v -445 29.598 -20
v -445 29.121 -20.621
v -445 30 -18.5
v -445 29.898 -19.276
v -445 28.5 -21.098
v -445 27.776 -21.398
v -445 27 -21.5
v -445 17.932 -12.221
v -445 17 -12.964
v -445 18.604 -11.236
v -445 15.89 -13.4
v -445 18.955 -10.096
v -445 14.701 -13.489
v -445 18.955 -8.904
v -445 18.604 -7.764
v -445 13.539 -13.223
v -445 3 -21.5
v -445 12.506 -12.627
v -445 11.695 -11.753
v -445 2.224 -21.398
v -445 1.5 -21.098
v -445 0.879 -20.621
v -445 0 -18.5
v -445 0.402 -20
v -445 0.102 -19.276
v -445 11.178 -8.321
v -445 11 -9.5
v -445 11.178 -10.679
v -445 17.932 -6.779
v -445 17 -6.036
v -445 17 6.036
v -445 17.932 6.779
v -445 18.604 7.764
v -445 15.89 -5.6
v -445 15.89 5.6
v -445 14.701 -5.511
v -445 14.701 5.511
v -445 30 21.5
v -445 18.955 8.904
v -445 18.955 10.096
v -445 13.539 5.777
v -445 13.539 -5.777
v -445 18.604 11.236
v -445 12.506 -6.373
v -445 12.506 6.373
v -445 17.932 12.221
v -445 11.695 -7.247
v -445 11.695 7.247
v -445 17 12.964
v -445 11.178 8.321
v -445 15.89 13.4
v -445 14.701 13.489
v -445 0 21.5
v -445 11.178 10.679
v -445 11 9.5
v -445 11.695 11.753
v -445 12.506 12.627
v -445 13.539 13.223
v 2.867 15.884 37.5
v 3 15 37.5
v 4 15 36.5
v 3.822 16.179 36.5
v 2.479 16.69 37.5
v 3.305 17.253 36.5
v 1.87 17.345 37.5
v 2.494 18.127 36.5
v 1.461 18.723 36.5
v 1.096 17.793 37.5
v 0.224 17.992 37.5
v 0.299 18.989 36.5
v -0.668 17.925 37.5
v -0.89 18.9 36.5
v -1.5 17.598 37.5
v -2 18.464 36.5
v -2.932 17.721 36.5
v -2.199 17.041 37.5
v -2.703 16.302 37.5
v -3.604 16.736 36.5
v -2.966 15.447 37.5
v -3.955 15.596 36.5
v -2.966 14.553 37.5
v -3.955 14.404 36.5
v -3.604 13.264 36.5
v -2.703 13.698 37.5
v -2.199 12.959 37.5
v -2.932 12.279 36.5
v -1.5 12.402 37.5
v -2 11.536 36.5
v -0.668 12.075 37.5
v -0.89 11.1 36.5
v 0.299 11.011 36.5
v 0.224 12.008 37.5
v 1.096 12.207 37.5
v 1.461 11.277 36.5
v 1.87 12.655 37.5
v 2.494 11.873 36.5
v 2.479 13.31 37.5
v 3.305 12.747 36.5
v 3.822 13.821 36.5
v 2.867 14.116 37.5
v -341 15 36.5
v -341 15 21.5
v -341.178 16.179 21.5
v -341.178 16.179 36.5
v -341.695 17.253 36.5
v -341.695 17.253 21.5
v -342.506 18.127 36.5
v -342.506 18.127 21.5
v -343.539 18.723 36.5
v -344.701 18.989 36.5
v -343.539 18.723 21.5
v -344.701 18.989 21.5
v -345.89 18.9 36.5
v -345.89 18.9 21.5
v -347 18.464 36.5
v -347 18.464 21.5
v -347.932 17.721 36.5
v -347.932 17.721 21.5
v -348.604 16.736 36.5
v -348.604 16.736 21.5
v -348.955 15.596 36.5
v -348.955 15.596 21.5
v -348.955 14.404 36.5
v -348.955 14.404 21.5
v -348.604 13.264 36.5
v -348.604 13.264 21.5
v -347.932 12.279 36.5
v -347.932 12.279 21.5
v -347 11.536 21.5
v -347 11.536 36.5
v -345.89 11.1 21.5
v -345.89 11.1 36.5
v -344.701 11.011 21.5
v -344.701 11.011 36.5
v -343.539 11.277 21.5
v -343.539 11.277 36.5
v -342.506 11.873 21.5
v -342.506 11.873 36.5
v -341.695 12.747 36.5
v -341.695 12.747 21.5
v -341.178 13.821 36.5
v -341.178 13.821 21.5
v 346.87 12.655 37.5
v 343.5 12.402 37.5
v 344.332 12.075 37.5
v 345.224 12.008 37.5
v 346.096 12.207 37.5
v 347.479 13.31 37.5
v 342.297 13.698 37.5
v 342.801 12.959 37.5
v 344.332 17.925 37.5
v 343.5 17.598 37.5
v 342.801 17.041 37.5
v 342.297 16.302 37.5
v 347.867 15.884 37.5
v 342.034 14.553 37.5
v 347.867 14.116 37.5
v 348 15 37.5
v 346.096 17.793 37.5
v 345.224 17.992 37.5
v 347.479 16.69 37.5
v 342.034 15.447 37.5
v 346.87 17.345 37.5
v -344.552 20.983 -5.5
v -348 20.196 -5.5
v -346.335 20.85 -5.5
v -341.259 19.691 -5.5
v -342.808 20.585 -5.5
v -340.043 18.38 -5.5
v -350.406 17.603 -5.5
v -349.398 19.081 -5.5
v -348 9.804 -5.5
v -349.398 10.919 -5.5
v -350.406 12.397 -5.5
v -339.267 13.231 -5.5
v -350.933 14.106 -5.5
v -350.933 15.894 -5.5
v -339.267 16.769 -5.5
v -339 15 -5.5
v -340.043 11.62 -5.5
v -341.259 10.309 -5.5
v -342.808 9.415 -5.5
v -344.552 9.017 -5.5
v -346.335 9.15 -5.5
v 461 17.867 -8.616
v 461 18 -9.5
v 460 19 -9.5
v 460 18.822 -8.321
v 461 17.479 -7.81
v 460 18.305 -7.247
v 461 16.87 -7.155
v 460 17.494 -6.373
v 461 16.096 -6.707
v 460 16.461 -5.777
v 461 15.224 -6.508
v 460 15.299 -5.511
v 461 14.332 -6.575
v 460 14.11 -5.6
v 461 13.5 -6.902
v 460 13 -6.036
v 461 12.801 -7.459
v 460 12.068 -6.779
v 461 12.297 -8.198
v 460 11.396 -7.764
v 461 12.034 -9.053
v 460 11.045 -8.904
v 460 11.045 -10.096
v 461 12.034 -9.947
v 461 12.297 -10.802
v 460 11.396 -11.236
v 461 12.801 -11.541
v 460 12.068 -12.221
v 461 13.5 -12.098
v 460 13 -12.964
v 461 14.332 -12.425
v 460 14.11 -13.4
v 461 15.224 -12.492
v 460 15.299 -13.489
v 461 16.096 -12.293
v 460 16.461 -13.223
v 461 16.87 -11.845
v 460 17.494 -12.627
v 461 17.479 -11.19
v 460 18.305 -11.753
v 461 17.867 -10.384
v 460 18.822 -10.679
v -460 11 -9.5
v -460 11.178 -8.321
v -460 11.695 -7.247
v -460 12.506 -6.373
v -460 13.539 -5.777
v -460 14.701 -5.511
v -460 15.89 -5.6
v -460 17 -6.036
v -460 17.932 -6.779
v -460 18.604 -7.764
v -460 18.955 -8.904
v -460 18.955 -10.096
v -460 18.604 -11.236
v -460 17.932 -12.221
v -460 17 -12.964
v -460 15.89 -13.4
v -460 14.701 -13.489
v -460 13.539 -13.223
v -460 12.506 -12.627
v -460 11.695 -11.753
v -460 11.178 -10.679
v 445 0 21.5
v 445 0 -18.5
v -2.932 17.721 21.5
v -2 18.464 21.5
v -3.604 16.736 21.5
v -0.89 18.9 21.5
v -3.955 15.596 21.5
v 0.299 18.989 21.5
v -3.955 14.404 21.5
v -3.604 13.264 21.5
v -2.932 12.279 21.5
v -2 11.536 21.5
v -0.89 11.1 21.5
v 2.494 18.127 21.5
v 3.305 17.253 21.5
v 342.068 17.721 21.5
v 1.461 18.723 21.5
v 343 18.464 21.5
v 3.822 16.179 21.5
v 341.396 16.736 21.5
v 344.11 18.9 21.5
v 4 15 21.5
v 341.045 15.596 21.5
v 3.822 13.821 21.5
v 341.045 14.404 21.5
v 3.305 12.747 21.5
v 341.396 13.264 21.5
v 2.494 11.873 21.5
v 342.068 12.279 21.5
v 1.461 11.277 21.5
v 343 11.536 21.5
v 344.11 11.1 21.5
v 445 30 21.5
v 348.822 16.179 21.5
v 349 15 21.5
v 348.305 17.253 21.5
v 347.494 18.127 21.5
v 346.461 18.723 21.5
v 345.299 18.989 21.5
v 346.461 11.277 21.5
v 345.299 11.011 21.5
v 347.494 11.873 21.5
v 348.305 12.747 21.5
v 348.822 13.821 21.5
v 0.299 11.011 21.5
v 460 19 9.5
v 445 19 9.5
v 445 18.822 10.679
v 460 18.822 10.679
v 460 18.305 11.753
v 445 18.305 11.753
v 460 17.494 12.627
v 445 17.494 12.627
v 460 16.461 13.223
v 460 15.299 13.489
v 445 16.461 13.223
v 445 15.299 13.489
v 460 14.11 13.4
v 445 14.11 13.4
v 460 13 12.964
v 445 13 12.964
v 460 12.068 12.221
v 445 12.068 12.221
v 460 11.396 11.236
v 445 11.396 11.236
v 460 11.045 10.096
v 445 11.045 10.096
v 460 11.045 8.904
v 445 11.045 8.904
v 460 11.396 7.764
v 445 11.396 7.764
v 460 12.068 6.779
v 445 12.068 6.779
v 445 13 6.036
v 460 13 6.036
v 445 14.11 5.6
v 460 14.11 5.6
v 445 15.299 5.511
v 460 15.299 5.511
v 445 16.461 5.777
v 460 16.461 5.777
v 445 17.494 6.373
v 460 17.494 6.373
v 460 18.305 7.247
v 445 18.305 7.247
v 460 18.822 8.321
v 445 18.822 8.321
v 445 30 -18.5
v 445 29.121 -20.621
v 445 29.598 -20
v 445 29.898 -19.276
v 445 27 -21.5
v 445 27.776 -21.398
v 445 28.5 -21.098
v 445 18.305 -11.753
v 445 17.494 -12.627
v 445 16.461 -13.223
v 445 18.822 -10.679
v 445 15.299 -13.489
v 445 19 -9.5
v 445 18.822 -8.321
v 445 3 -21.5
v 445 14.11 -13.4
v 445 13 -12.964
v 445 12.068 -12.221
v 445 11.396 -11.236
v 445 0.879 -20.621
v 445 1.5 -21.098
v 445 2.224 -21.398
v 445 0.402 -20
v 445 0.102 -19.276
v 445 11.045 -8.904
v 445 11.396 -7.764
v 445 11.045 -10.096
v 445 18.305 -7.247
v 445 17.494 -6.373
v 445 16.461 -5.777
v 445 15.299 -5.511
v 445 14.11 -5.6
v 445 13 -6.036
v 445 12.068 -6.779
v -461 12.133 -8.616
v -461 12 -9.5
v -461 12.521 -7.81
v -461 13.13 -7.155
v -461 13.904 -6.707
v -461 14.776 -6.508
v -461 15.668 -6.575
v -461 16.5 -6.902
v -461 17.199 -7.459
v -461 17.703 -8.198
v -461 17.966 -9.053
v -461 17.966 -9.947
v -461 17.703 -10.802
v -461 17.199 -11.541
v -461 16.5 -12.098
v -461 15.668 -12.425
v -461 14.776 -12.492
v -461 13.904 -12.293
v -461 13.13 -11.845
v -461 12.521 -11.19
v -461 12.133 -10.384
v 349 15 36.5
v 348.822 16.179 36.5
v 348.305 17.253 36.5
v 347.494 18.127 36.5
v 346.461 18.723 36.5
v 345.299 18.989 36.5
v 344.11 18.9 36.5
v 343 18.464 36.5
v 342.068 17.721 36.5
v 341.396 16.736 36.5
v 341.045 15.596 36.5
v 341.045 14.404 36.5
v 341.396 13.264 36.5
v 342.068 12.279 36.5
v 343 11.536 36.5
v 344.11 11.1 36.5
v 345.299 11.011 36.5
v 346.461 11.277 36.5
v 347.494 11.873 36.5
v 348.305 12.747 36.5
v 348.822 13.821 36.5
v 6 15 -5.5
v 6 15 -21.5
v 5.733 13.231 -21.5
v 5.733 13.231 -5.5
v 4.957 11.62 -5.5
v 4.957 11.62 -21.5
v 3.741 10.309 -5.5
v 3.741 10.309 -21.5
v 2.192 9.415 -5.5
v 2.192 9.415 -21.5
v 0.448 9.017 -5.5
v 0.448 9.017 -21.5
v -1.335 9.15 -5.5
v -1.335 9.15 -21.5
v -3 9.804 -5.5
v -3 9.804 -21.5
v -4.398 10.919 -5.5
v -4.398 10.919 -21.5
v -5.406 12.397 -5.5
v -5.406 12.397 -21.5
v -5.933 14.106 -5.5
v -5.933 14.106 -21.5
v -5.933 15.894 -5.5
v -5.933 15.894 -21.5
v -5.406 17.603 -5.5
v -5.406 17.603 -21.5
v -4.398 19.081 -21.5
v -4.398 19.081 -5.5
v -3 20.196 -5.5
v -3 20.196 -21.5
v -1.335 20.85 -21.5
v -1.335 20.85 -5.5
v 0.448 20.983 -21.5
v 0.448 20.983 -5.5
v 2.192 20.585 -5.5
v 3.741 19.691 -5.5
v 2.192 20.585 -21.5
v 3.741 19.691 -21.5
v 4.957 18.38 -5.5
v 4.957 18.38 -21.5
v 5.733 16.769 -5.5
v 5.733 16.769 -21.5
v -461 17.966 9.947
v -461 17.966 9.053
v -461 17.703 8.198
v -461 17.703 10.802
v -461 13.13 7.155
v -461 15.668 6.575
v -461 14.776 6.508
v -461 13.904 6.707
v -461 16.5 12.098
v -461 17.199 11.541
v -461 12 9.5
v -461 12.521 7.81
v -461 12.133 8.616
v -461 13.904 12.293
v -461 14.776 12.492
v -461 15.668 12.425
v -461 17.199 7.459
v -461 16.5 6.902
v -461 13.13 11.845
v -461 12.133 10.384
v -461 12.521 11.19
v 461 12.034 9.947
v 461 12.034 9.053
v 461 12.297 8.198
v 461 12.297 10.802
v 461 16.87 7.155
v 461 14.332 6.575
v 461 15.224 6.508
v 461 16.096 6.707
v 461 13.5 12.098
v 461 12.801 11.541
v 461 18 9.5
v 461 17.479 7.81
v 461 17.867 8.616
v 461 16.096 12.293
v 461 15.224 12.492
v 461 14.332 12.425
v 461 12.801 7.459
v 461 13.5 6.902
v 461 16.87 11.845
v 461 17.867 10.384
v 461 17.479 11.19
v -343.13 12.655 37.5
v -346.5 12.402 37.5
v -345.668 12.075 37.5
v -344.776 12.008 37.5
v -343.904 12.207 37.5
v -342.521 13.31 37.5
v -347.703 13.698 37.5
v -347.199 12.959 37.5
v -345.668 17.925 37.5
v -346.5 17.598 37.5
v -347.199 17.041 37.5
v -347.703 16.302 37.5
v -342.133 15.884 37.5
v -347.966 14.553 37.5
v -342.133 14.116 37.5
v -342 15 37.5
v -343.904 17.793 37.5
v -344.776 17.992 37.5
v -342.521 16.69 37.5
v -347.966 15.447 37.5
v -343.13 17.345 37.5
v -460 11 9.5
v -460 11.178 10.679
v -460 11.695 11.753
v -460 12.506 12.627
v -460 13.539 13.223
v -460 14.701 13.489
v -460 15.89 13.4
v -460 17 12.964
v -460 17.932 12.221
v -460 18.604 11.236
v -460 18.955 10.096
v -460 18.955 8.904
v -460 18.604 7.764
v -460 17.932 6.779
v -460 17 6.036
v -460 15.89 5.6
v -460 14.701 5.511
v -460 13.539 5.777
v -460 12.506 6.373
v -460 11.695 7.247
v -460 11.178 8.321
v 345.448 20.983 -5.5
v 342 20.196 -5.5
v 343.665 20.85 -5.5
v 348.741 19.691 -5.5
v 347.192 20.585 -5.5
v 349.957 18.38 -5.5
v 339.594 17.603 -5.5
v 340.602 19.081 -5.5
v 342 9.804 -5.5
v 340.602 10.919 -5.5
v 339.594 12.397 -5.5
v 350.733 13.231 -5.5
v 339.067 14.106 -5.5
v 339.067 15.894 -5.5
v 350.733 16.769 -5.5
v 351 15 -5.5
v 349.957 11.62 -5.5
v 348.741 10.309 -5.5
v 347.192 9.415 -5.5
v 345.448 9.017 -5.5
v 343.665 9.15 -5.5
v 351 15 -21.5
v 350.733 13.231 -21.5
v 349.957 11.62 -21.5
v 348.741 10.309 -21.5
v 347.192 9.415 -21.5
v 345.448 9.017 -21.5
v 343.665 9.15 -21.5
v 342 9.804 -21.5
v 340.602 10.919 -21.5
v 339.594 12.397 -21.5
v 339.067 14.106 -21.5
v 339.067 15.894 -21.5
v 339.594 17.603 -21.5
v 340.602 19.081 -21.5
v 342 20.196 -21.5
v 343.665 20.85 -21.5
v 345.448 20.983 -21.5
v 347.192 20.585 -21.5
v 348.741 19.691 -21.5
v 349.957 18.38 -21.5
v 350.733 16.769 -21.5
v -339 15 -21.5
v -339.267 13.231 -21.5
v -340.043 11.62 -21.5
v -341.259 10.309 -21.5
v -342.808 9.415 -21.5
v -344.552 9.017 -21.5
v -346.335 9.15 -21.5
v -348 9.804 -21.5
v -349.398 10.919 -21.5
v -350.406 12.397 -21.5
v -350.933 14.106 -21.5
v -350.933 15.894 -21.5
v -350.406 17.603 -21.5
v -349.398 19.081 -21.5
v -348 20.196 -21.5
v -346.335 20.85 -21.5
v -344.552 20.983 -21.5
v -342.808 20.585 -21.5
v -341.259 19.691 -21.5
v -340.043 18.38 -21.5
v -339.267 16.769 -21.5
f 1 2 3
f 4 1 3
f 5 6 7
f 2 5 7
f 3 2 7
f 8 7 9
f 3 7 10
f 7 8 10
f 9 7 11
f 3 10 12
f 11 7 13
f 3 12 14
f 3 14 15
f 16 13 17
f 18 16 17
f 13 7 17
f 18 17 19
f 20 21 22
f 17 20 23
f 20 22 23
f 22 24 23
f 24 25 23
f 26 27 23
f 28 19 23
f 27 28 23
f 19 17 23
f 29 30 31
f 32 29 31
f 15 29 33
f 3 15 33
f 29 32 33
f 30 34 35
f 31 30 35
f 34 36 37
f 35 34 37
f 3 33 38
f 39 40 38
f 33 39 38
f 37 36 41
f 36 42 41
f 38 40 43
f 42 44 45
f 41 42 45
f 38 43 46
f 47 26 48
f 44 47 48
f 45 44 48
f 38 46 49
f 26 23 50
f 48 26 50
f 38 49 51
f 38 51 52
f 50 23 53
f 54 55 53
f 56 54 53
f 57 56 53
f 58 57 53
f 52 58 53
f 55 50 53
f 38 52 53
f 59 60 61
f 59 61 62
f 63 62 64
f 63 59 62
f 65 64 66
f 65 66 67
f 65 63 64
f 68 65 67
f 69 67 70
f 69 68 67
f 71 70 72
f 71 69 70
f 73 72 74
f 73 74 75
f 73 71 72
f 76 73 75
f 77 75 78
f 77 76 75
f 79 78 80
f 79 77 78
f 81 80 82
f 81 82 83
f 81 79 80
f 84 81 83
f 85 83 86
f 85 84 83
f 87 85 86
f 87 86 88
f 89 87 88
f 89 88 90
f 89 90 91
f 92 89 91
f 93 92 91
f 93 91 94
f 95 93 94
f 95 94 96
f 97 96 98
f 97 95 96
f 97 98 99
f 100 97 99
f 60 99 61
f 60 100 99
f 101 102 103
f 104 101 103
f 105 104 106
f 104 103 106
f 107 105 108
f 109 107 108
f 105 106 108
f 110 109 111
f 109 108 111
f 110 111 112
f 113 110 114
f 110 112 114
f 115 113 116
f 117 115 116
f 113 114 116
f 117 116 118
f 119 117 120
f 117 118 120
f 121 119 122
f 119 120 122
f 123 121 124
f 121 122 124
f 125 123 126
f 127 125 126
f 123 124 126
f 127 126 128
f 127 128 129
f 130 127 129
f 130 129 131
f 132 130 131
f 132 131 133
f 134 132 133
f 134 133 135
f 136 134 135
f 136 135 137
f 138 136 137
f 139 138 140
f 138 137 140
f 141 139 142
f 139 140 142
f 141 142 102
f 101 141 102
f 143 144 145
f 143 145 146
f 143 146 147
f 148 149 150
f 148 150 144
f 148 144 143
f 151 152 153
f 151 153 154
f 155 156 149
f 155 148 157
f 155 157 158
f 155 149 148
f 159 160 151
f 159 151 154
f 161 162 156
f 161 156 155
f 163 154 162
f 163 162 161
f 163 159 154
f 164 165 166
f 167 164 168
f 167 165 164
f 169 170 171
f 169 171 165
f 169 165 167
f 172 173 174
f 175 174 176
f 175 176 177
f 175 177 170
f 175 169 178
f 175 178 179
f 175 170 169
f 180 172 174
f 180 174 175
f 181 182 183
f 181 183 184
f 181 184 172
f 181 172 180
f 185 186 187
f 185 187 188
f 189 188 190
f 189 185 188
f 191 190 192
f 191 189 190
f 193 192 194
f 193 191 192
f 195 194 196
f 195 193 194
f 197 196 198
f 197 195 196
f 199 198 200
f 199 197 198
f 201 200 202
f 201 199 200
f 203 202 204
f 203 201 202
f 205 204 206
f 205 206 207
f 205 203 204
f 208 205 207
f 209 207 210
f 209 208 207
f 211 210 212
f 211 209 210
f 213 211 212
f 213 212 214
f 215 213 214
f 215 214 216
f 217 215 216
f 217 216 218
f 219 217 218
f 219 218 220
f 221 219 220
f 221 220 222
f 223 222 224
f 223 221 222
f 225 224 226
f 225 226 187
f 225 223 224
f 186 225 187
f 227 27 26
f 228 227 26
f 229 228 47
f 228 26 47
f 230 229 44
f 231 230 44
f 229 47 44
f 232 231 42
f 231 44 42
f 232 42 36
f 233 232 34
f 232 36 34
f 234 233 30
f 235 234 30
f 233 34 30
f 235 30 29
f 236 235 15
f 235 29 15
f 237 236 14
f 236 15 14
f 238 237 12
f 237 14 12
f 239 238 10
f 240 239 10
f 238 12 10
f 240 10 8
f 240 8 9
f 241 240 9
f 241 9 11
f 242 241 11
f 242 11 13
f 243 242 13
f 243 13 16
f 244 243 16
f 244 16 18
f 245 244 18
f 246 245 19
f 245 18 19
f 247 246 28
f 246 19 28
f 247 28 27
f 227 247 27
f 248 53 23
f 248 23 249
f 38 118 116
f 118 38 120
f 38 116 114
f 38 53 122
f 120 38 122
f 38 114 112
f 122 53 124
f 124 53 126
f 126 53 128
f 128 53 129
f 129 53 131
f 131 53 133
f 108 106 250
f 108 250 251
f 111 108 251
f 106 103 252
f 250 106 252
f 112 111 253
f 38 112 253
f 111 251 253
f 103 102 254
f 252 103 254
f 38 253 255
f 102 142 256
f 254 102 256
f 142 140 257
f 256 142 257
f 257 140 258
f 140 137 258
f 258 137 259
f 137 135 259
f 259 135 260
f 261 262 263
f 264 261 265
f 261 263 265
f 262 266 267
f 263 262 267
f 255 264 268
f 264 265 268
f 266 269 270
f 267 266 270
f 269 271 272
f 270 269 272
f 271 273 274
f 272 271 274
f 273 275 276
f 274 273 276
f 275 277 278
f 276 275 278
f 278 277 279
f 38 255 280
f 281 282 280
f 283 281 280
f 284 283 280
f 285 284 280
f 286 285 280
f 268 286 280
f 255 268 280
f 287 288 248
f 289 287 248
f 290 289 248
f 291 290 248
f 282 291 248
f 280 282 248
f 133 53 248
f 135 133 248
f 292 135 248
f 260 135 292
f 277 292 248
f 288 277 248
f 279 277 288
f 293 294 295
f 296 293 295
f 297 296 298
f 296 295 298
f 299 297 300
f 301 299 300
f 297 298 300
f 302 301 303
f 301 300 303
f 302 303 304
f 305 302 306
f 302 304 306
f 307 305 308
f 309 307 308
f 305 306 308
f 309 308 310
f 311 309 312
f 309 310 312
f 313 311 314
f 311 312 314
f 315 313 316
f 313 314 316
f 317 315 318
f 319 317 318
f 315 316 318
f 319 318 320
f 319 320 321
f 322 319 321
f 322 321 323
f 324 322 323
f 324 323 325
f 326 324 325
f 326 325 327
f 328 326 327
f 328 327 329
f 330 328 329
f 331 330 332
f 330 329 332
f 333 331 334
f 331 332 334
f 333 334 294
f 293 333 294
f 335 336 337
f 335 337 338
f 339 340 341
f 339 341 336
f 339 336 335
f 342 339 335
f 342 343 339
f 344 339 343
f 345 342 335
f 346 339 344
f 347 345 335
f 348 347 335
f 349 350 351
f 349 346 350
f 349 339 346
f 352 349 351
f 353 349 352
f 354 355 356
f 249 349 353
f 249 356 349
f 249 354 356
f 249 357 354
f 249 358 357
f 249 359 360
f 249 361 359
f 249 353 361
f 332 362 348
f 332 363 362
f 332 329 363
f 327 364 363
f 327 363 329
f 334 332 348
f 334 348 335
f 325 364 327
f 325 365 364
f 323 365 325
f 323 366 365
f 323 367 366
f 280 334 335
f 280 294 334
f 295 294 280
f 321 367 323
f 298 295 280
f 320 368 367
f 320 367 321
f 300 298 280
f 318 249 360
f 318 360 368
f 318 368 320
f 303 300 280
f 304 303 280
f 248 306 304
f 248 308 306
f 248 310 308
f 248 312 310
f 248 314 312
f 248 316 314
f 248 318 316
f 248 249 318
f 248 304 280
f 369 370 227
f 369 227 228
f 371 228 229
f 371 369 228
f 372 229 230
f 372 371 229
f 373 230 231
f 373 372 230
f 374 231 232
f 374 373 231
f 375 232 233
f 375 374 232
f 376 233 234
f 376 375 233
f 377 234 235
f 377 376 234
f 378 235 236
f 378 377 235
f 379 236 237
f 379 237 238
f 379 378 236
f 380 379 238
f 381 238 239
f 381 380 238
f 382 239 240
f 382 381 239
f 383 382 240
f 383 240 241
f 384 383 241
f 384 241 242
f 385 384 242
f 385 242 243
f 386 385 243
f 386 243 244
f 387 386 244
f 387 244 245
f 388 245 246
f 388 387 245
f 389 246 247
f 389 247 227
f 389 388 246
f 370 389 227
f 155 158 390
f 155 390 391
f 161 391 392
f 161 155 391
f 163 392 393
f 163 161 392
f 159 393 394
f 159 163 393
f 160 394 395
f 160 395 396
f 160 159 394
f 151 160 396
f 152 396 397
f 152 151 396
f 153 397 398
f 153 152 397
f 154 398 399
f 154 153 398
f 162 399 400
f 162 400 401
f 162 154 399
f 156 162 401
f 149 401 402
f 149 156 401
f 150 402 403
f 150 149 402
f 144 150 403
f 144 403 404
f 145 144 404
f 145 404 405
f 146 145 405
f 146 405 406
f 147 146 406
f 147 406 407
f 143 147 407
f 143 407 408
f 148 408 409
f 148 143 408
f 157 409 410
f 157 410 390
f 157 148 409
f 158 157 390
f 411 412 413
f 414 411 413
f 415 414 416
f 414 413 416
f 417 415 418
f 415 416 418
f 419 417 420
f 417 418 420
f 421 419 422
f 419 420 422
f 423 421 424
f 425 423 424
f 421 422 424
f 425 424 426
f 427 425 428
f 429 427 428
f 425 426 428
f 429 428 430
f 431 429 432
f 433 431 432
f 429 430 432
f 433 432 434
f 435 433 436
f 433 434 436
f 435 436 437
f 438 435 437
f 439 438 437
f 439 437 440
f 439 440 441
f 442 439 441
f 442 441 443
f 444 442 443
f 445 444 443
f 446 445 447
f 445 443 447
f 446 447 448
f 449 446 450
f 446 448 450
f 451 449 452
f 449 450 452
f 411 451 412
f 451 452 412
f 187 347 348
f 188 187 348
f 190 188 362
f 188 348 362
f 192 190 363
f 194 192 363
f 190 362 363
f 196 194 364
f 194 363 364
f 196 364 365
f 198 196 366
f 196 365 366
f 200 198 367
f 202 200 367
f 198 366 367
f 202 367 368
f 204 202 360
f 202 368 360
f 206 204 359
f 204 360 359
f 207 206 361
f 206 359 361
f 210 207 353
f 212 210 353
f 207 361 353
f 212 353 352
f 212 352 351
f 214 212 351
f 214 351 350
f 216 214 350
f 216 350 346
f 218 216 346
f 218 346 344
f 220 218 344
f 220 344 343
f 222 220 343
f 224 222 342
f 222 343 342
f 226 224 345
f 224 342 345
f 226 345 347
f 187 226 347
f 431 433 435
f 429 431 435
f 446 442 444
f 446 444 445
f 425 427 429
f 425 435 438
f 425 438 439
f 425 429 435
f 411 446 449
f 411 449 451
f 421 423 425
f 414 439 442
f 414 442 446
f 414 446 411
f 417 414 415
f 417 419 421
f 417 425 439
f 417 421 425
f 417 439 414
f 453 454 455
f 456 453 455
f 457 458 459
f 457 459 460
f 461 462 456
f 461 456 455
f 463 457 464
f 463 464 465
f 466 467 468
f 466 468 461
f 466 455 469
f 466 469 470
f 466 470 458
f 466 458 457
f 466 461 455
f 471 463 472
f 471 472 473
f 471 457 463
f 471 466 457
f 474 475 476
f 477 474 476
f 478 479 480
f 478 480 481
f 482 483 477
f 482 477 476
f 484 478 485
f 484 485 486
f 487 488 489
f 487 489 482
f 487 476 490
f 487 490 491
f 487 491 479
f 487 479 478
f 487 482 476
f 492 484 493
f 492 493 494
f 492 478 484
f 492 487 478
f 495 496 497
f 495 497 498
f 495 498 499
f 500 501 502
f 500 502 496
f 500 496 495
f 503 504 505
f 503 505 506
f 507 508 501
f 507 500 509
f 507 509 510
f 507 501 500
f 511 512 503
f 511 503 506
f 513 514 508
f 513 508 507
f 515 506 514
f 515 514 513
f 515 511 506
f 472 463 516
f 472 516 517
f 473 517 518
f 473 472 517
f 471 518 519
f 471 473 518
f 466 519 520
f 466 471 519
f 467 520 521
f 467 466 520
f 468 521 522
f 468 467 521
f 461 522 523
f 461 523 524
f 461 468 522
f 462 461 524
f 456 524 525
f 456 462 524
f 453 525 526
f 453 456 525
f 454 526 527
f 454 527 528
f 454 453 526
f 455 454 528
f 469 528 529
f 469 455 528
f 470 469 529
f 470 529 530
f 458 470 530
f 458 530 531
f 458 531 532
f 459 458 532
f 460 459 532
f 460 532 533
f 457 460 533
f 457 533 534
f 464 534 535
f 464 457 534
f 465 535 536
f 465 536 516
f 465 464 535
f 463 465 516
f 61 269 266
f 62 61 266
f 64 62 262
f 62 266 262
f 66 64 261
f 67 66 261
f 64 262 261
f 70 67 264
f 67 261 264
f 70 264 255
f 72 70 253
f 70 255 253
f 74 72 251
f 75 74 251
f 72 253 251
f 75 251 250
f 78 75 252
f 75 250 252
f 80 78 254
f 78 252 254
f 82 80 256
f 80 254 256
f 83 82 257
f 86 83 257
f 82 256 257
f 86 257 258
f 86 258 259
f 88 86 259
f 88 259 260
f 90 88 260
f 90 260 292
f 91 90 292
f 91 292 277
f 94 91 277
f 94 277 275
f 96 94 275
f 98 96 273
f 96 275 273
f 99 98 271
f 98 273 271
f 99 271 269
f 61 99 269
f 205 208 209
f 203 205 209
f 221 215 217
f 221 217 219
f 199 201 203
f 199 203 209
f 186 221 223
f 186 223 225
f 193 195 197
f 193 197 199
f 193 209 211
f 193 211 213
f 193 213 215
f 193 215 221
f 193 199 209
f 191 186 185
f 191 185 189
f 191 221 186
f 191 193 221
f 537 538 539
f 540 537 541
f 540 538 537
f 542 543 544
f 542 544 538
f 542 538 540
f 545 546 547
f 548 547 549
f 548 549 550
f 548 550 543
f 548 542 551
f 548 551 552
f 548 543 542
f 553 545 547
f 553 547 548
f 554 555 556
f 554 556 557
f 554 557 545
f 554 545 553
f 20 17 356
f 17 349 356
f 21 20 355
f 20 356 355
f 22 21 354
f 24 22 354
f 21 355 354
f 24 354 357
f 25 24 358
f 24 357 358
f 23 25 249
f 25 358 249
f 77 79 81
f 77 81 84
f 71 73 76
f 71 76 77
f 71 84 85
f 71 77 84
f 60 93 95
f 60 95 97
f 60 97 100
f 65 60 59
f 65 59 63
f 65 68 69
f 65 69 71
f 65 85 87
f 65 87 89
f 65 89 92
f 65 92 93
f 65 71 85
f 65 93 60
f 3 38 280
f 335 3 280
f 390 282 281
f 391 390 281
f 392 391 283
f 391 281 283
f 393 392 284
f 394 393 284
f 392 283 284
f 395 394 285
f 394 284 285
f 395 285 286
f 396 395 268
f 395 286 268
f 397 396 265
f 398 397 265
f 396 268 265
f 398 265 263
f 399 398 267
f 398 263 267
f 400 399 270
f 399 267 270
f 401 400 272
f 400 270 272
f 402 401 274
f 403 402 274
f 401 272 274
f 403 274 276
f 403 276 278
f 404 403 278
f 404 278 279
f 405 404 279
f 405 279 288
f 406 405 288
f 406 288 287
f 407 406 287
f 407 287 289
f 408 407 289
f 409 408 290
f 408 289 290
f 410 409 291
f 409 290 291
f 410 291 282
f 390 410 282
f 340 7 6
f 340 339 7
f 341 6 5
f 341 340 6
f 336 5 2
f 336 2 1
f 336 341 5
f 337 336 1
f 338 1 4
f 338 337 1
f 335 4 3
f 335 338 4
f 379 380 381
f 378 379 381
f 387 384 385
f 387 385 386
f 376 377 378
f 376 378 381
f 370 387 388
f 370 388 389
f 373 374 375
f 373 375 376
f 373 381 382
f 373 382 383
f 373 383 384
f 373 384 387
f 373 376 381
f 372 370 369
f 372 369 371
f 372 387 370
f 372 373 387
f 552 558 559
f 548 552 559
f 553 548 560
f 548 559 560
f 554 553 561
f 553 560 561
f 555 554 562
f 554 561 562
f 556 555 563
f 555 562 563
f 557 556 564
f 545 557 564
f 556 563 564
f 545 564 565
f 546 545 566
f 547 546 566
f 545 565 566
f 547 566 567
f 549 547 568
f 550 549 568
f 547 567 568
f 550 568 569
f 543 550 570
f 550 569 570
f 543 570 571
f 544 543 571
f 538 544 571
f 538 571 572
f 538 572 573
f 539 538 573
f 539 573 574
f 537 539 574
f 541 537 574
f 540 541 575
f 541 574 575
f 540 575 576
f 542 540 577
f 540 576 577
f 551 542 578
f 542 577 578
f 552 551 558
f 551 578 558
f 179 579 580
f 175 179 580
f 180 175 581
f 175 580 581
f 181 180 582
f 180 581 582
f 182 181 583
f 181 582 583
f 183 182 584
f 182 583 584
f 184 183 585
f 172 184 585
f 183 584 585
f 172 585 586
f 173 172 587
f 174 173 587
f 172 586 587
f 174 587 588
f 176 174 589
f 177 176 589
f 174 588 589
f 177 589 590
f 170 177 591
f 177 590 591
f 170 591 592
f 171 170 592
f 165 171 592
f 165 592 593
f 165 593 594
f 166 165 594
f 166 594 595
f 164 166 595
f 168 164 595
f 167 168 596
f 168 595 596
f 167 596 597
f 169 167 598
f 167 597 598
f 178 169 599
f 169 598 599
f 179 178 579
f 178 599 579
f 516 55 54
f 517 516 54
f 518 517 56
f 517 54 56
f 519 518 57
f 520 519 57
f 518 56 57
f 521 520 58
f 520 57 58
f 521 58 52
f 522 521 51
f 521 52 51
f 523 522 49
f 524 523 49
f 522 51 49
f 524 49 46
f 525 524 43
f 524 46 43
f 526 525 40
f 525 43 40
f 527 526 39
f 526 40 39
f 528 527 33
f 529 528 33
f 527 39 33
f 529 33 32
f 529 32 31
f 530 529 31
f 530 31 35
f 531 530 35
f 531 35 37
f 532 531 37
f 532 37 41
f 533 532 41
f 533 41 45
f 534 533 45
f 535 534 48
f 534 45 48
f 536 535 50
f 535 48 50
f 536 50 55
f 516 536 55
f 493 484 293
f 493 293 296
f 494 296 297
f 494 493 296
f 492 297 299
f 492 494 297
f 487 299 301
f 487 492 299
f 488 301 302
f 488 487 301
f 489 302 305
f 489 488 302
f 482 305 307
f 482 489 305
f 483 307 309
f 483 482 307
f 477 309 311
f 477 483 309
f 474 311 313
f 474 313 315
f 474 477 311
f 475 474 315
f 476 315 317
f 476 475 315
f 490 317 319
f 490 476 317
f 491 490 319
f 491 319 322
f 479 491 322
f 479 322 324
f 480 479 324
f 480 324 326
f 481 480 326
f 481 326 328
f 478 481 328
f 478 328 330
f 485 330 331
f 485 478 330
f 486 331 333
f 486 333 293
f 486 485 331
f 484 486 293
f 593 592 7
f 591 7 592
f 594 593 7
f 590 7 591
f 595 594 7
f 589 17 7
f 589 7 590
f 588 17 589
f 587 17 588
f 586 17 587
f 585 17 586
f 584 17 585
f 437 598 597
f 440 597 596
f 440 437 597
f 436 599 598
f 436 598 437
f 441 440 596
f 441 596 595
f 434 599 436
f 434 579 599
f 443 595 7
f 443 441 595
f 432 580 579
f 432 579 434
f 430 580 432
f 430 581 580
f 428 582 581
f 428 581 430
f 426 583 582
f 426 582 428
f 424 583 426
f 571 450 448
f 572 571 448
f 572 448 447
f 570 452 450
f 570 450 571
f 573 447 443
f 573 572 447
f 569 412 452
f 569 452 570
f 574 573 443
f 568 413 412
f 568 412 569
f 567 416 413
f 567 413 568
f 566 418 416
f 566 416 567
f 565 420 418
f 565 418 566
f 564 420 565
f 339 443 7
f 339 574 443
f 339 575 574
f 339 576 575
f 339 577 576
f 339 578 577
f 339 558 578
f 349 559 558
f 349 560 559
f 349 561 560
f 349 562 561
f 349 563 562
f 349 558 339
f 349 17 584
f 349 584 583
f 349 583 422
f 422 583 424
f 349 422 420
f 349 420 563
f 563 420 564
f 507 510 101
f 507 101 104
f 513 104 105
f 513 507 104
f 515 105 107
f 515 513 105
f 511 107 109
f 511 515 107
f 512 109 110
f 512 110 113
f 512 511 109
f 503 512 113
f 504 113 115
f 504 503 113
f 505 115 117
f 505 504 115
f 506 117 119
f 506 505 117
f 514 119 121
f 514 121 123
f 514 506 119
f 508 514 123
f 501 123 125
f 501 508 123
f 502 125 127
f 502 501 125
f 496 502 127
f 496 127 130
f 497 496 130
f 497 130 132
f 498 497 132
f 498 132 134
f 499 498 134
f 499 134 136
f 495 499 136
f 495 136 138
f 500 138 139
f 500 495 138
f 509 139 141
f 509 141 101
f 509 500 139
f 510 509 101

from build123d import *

# Parameters (mm, degrees)
F0_W      = 890
F0_H      = 43
F1_DEPTH  = 30
F2_R      = 4
F3_DEPTH  = 16
F4_SIZE   = 1
F5_R      = 4
F6_DEPTH  = 16
F7_SIZE   = 1
F8_R      = 3
F9_R      = 6
F10_DEPTH = 16
F11_R     = 4
F12_DEPTH = 16
F13_SIZE  = 1


with BuildPart() as f1:
    # F0 (on Front) → F1 (new body)
    with BuildSketch(Plane.XZ):
        Rectangle(F0_W, F0_H)
    extrude(amount=-F1_DEPTH)

    # F2 (on face) → F3 (join)
    with BuildSketch(Plane.YZ.offset(445)):
        with Locations((15, 9.5)):
            Circle(F2_R)
        with Locations((15, -9.5)):
            Circle(F2_R)
    extrude(amount=F3_DEPTH)

    # F4
    f4_edges = [f1.edges().sort_by_distance(p)[0] for p in [
        (461, 11, 9.5),
        (461, 11, -9.5),
    ]]
    chamfer(f4_edges, length=F4_SIZE)

    # F5 (on face) → F6 (join)
    with BuildSketch(Plane(origin=(-445, 0, 0), x_dir=(0, -1, 0), z_dir=(-1, 0, 0))):
        with Locations((-15, 9.5)):
            Circle(F5_R)
        with Locations((-15, -9.5)):
            Circle(F5_R)
    extrude(amount=F6_DEPTH)

    # F7
    f7_edges = [f1.edges().sort_by_distance(p)[0] for p in [
        (-461, 19, 9.5),
        (-461, 19, -9.5),
    ]]
    chamfer(f7_edges, length=F7_SIZE)

    # F8
    f8_edges = [f1.edges().sort_by_distance(p)[0] for p in [
        (0, 30, -21.5),
        (0, 0, -21.5),
    ]]
    fillet(f8_edges, radius=F8_R)

    # F9 (on face) → F10 (cut)
    with BuildSketch(Plane(origin=(0, 0, -21.5), x_dir=(1, 0, 0), z_dir=(0, 0, -1))):
        with Locations((-345, -15)):
            Circle(F9_R)
        with Locations((0, -15)):
            Circle(F9_R)
        with Locations((345, -15)):
            Circle(F9_R)
    extrude(amount=-F10_DEPTH, mode=Mode.SUBTRACT)

    # F11 (on face) → F12 (join)
    with BuildSketch(Plane.XY.offset(21.5)):
        with Locations((0, 15)):
            Circle(F11_R)
        with Locations((-345, 15)):
            Circle(F11_R)
        with Locations((345, 15)):
            Circle(F11_R)
    extrude(amount=F12_DEPTH)

    # F13
    f13_edges = [f1.edges().sort_by_distance(p)[0] for p in [
        (-349, 15, 37.5),
        (-4, 15, 37.5),
        (341, 15, 37.5),
    ]]
    chamfer(f13_edges, length=F13_SIZE)


solid = f1.part
